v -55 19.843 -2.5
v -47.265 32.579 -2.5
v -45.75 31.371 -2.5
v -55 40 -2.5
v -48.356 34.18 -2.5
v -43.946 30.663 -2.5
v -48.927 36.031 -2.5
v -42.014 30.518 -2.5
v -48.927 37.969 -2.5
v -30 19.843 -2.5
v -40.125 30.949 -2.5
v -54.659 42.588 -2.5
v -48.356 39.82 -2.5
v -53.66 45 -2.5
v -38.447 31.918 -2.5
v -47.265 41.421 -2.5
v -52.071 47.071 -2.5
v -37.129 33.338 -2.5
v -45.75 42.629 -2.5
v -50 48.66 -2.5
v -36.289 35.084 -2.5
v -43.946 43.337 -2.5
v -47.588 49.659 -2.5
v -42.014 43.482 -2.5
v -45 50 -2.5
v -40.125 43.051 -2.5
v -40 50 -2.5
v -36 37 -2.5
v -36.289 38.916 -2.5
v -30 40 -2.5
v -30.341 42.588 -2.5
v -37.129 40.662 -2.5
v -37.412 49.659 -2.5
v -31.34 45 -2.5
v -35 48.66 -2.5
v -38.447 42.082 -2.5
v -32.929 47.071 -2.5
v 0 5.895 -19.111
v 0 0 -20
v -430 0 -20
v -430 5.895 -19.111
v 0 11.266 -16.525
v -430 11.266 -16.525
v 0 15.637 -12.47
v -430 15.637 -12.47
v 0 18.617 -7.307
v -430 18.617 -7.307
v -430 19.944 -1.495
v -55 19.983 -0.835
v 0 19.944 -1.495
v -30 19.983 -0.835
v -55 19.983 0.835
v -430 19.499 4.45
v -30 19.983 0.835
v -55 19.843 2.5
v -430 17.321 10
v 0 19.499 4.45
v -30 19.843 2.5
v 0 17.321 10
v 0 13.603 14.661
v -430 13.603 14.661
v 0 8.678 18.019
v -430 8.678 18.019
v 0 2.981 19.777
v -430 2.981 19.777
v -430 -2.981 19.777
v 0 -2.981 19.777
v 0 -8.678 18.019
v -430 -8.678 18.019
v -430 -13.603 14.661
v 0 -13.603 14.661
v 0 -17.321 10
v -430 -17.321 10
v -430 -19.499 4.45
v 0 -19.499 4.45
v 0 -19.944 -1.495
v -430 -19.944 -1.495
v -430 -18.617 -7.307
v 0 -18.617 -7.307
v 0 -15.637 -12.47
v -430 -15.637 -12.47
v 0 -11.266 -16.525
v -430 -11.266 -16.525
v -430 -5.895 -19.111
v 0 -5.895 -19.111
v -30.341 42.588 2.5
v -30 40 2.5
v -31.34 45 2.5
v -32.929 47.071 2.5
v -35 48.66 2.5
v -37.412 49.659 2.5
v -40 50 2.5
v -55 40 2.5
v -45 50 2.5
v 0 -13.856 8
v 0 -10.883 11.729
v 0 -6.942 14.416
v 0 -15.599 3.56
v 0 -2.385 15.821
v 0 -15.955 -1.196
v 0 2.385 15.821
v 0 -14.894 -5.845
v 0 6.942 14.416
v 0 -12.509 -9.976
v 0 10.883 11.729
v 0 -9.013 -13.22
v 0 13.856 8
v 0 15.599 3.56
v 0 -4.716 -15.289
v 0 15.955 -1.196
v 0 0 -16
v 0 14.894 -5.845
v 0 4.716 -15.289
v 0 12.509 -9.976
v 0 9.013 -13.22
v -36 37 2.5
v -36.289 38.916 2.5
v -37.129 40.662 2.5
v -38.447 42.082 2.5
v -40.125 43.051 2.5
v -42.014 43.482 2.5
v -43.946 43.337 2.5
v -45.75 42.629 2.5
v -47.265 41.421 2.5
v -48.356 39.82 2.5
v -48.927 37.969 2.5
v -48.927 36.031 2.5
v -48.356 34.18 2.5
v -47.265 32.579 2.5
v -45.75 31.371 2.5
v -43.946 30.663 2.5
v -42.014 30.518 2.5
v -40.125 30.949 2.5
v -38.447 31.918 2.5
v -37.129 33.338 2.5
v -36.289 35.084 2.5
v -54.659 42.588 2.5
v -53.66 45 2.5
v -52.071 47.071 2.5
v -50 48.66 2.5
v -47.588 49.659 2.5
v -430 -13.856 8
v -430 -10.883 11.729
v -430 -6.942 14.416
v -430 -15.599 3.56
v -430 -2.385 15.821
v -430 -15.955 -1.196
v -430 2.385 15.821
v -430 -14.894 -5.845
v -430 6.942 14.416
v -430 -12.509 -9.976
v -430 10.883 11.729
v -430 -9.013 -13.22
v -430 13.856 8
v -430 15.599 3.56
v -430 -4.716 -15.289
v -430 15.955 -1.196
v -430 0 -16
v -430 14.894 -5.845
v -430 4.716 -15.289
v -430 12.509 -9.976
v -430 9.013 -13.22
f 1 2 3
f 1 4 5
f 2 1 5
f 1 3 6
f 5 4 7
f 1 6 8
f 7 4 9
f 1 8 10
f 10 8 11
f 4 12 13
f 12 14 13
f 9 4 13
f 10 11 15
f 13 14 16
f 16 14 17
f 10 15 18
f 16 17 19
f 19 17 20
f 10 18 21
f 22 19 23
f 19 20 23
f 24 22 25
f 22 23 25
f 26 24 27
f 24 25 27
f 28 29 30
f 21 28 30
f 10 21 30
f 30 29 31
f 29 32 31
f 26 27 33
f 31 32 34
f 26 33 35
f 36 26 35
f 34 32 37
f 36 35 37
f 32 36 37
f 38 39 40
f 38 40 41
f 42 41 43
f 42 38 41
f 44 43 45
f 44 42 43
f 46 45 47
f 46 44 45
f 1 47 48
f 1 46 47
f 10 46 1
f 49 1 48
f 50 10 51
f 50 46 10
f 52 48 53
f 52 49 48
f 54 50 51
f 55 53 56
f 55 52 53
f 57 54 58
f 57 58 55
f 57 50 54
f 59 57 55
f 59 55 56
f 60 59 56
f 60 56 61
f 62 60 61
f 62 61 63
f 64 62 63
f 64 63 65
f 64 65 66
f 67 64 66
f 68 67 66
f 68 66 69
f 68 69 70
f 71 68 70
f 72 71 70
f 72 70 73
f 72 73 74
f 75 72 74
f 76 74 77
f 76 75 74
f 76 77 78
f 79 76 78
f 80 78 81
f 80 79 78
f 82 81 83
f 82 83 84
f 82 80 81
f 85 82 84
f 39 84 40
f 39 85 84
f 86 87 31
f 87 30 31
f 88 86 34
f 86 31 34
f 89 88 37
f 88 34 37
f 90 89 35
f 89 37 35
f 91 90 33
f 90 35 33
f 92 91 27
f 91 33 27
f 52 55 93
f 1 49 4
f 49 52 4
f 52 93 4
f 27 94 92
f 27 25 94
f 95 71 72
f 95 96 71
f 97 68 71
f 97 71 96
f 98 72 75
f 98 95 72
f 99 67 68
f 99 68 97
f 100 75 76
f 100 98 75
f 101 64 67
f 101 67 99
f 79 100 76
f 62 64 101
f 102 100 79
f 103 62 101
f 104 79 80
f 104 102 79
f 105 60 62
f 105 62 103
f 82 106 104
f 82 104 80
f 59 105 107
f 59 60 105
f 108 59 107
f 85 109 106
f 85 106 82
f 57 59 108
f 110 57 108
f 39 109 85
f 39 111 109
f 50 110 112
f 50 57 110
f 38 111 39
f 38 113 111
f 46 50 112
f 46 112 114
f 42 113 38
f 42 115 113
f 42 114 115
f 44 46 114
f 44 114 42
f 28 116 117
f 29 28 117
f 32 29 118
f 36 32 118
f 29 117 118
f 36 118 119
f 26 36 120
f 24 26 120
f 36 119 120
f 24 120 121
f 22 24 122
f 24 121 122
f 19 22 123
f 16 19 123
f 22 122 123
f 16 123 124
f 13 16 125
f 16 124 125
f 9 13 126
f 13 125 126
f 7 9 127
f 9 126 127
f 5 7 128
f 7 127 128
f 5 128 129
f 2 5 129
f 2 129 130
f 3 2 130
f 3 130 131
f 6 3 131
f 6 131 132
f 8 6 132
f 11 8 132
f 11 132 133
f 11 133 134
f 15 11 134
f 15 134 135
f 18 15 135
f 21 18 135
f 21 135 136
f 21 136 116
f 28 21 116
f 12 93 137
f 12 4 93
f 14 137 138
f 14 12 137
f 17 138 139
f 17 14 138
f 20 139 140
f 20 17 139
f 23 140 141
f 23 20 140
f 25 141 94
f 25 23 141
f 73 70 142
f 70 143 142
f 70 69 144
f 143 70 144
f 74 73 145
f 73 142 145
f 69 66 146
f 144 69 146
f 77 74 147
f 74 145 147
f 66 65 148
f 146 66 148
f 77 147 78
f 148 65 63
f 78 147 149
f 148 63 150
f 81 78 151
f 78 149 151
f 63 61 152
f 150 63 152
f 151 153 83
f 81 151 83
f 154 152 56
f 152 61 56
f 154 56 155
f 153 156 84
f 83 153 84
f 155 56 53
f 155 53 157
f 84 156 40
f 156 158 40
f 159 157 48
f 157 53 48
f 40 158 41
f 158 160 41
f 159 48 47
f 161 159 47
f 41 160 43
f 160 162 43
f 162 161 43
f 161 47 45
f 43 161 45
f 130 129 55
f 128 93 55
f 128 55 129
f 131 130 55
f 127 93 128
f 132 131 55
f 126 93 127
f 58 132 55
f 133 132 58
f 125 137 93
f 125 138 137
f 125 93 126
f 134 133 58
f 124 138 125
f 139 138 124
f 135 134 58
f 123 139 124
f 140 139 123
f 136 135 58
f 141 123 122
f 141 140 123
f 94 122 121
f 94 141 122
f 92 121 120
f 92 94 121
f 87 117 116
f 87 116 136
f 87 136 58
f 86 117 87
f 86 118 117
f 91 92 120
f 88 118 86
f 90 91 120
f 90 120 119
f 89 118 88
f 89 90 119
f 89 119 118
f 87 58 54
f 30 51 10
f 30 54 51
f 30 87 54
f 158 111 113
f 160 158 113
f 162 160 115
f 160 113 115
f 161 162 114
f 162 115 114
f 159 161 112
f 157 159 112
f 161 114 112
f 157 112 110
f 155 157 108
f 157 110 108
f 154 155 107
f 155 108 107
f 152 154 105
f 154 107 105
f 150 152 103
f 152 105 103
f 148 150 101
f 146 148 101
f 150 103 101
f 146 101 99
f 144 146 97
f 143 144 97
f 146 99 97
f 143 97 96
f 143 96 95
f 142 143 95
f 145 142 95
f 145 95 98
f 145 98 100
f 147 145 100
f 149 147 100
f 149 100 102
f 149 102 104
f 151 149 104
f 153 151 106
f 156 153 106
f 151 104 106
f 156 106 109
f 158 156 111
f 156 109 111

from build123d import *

# Parameters (mm, degrees)
SKETCH1_R                = 20
SKETCH1_R_2              = 16
BOSS_EXTRUDE1_DEPTH      = 430
BOSS_EXTRUDE2_REACH      = 438.119
BOSS_EXTRUDE2_END_RADIUS = 20
SKETCH2_W                = 25
SKETCH2_H                = 5
FILLET1_R                = 10
SKETCH3_R                = 6.5
CUT_EXTRUDE1_DEPTH       = 10


with BuildPart() as part:
    # Sketch1 → Boss-Extrude1 (new body)
    with BuildSketch(Plane(origin=(0, 0, 0), x_dir=(0, 0, -1), z_dir=(1, 0, 0))):
        Circle(SKETCH1_R)
        Circle(SKETCH1_R_2, mode=Mode.SUBTRACT)
    extrude(amount=-BOSS_EXTRUDE1_DEPTH)

    # Boss-Extrude2: up to this cylinder (the profile starts outside it)
    boss_extrude2_end = Plane(origin=(-42.5, 0, 0), z_dir=(1, 0, 0)) * Cylinder(BOSS_EXTRUDE2_END_RADIUS, 917.238, mode=Mode.PRIVATE)
    # Sketch2 → Boss-Extrude2 (add, up to the surface)
    with BuildSketch(Plane(origin=(0, 50, 0), x_dir=(1, 0, 0), z_dir=(0, 1, 0)), mode=Mode.PRIVATE) as boss_extrude2_sk1:
        with Locations((-42.5, 0)):
            Rectangle(SKETCH2_W, SKETCH2_H)
    boss_extrude2_tool1 = extrude(boss_extrude2_sk1.sketch, amount=-BOSS_EXTRUDE2_REACH, mode=Mode.PRIVATE) - boss_extrude2_end
    add(boss_extrude2_tool1.solids().sort_by_distance((-42.5, 50, 0))[0])

    # Fillet1
    fillet1_edges = [part.edges().sort_by_distance(p)[0] for p in [
        (-30, 50, 0),
        (-55, 50, 0),
    ]]
    fillet(fillet1_edges, radius=FILLET1_R)

    # Sketch3 → Cut-Extrude1 (cut)
    with BuildSketch(Plane.XY.offset(2.5)):
        with Locations((-42.5, 37)):
            Circle(SKETCH3_R)
    extrude(amount=-CUT_EXTRUDE1_DEPTH, mode=Mode.SUBTRACT)


solid = part.part
